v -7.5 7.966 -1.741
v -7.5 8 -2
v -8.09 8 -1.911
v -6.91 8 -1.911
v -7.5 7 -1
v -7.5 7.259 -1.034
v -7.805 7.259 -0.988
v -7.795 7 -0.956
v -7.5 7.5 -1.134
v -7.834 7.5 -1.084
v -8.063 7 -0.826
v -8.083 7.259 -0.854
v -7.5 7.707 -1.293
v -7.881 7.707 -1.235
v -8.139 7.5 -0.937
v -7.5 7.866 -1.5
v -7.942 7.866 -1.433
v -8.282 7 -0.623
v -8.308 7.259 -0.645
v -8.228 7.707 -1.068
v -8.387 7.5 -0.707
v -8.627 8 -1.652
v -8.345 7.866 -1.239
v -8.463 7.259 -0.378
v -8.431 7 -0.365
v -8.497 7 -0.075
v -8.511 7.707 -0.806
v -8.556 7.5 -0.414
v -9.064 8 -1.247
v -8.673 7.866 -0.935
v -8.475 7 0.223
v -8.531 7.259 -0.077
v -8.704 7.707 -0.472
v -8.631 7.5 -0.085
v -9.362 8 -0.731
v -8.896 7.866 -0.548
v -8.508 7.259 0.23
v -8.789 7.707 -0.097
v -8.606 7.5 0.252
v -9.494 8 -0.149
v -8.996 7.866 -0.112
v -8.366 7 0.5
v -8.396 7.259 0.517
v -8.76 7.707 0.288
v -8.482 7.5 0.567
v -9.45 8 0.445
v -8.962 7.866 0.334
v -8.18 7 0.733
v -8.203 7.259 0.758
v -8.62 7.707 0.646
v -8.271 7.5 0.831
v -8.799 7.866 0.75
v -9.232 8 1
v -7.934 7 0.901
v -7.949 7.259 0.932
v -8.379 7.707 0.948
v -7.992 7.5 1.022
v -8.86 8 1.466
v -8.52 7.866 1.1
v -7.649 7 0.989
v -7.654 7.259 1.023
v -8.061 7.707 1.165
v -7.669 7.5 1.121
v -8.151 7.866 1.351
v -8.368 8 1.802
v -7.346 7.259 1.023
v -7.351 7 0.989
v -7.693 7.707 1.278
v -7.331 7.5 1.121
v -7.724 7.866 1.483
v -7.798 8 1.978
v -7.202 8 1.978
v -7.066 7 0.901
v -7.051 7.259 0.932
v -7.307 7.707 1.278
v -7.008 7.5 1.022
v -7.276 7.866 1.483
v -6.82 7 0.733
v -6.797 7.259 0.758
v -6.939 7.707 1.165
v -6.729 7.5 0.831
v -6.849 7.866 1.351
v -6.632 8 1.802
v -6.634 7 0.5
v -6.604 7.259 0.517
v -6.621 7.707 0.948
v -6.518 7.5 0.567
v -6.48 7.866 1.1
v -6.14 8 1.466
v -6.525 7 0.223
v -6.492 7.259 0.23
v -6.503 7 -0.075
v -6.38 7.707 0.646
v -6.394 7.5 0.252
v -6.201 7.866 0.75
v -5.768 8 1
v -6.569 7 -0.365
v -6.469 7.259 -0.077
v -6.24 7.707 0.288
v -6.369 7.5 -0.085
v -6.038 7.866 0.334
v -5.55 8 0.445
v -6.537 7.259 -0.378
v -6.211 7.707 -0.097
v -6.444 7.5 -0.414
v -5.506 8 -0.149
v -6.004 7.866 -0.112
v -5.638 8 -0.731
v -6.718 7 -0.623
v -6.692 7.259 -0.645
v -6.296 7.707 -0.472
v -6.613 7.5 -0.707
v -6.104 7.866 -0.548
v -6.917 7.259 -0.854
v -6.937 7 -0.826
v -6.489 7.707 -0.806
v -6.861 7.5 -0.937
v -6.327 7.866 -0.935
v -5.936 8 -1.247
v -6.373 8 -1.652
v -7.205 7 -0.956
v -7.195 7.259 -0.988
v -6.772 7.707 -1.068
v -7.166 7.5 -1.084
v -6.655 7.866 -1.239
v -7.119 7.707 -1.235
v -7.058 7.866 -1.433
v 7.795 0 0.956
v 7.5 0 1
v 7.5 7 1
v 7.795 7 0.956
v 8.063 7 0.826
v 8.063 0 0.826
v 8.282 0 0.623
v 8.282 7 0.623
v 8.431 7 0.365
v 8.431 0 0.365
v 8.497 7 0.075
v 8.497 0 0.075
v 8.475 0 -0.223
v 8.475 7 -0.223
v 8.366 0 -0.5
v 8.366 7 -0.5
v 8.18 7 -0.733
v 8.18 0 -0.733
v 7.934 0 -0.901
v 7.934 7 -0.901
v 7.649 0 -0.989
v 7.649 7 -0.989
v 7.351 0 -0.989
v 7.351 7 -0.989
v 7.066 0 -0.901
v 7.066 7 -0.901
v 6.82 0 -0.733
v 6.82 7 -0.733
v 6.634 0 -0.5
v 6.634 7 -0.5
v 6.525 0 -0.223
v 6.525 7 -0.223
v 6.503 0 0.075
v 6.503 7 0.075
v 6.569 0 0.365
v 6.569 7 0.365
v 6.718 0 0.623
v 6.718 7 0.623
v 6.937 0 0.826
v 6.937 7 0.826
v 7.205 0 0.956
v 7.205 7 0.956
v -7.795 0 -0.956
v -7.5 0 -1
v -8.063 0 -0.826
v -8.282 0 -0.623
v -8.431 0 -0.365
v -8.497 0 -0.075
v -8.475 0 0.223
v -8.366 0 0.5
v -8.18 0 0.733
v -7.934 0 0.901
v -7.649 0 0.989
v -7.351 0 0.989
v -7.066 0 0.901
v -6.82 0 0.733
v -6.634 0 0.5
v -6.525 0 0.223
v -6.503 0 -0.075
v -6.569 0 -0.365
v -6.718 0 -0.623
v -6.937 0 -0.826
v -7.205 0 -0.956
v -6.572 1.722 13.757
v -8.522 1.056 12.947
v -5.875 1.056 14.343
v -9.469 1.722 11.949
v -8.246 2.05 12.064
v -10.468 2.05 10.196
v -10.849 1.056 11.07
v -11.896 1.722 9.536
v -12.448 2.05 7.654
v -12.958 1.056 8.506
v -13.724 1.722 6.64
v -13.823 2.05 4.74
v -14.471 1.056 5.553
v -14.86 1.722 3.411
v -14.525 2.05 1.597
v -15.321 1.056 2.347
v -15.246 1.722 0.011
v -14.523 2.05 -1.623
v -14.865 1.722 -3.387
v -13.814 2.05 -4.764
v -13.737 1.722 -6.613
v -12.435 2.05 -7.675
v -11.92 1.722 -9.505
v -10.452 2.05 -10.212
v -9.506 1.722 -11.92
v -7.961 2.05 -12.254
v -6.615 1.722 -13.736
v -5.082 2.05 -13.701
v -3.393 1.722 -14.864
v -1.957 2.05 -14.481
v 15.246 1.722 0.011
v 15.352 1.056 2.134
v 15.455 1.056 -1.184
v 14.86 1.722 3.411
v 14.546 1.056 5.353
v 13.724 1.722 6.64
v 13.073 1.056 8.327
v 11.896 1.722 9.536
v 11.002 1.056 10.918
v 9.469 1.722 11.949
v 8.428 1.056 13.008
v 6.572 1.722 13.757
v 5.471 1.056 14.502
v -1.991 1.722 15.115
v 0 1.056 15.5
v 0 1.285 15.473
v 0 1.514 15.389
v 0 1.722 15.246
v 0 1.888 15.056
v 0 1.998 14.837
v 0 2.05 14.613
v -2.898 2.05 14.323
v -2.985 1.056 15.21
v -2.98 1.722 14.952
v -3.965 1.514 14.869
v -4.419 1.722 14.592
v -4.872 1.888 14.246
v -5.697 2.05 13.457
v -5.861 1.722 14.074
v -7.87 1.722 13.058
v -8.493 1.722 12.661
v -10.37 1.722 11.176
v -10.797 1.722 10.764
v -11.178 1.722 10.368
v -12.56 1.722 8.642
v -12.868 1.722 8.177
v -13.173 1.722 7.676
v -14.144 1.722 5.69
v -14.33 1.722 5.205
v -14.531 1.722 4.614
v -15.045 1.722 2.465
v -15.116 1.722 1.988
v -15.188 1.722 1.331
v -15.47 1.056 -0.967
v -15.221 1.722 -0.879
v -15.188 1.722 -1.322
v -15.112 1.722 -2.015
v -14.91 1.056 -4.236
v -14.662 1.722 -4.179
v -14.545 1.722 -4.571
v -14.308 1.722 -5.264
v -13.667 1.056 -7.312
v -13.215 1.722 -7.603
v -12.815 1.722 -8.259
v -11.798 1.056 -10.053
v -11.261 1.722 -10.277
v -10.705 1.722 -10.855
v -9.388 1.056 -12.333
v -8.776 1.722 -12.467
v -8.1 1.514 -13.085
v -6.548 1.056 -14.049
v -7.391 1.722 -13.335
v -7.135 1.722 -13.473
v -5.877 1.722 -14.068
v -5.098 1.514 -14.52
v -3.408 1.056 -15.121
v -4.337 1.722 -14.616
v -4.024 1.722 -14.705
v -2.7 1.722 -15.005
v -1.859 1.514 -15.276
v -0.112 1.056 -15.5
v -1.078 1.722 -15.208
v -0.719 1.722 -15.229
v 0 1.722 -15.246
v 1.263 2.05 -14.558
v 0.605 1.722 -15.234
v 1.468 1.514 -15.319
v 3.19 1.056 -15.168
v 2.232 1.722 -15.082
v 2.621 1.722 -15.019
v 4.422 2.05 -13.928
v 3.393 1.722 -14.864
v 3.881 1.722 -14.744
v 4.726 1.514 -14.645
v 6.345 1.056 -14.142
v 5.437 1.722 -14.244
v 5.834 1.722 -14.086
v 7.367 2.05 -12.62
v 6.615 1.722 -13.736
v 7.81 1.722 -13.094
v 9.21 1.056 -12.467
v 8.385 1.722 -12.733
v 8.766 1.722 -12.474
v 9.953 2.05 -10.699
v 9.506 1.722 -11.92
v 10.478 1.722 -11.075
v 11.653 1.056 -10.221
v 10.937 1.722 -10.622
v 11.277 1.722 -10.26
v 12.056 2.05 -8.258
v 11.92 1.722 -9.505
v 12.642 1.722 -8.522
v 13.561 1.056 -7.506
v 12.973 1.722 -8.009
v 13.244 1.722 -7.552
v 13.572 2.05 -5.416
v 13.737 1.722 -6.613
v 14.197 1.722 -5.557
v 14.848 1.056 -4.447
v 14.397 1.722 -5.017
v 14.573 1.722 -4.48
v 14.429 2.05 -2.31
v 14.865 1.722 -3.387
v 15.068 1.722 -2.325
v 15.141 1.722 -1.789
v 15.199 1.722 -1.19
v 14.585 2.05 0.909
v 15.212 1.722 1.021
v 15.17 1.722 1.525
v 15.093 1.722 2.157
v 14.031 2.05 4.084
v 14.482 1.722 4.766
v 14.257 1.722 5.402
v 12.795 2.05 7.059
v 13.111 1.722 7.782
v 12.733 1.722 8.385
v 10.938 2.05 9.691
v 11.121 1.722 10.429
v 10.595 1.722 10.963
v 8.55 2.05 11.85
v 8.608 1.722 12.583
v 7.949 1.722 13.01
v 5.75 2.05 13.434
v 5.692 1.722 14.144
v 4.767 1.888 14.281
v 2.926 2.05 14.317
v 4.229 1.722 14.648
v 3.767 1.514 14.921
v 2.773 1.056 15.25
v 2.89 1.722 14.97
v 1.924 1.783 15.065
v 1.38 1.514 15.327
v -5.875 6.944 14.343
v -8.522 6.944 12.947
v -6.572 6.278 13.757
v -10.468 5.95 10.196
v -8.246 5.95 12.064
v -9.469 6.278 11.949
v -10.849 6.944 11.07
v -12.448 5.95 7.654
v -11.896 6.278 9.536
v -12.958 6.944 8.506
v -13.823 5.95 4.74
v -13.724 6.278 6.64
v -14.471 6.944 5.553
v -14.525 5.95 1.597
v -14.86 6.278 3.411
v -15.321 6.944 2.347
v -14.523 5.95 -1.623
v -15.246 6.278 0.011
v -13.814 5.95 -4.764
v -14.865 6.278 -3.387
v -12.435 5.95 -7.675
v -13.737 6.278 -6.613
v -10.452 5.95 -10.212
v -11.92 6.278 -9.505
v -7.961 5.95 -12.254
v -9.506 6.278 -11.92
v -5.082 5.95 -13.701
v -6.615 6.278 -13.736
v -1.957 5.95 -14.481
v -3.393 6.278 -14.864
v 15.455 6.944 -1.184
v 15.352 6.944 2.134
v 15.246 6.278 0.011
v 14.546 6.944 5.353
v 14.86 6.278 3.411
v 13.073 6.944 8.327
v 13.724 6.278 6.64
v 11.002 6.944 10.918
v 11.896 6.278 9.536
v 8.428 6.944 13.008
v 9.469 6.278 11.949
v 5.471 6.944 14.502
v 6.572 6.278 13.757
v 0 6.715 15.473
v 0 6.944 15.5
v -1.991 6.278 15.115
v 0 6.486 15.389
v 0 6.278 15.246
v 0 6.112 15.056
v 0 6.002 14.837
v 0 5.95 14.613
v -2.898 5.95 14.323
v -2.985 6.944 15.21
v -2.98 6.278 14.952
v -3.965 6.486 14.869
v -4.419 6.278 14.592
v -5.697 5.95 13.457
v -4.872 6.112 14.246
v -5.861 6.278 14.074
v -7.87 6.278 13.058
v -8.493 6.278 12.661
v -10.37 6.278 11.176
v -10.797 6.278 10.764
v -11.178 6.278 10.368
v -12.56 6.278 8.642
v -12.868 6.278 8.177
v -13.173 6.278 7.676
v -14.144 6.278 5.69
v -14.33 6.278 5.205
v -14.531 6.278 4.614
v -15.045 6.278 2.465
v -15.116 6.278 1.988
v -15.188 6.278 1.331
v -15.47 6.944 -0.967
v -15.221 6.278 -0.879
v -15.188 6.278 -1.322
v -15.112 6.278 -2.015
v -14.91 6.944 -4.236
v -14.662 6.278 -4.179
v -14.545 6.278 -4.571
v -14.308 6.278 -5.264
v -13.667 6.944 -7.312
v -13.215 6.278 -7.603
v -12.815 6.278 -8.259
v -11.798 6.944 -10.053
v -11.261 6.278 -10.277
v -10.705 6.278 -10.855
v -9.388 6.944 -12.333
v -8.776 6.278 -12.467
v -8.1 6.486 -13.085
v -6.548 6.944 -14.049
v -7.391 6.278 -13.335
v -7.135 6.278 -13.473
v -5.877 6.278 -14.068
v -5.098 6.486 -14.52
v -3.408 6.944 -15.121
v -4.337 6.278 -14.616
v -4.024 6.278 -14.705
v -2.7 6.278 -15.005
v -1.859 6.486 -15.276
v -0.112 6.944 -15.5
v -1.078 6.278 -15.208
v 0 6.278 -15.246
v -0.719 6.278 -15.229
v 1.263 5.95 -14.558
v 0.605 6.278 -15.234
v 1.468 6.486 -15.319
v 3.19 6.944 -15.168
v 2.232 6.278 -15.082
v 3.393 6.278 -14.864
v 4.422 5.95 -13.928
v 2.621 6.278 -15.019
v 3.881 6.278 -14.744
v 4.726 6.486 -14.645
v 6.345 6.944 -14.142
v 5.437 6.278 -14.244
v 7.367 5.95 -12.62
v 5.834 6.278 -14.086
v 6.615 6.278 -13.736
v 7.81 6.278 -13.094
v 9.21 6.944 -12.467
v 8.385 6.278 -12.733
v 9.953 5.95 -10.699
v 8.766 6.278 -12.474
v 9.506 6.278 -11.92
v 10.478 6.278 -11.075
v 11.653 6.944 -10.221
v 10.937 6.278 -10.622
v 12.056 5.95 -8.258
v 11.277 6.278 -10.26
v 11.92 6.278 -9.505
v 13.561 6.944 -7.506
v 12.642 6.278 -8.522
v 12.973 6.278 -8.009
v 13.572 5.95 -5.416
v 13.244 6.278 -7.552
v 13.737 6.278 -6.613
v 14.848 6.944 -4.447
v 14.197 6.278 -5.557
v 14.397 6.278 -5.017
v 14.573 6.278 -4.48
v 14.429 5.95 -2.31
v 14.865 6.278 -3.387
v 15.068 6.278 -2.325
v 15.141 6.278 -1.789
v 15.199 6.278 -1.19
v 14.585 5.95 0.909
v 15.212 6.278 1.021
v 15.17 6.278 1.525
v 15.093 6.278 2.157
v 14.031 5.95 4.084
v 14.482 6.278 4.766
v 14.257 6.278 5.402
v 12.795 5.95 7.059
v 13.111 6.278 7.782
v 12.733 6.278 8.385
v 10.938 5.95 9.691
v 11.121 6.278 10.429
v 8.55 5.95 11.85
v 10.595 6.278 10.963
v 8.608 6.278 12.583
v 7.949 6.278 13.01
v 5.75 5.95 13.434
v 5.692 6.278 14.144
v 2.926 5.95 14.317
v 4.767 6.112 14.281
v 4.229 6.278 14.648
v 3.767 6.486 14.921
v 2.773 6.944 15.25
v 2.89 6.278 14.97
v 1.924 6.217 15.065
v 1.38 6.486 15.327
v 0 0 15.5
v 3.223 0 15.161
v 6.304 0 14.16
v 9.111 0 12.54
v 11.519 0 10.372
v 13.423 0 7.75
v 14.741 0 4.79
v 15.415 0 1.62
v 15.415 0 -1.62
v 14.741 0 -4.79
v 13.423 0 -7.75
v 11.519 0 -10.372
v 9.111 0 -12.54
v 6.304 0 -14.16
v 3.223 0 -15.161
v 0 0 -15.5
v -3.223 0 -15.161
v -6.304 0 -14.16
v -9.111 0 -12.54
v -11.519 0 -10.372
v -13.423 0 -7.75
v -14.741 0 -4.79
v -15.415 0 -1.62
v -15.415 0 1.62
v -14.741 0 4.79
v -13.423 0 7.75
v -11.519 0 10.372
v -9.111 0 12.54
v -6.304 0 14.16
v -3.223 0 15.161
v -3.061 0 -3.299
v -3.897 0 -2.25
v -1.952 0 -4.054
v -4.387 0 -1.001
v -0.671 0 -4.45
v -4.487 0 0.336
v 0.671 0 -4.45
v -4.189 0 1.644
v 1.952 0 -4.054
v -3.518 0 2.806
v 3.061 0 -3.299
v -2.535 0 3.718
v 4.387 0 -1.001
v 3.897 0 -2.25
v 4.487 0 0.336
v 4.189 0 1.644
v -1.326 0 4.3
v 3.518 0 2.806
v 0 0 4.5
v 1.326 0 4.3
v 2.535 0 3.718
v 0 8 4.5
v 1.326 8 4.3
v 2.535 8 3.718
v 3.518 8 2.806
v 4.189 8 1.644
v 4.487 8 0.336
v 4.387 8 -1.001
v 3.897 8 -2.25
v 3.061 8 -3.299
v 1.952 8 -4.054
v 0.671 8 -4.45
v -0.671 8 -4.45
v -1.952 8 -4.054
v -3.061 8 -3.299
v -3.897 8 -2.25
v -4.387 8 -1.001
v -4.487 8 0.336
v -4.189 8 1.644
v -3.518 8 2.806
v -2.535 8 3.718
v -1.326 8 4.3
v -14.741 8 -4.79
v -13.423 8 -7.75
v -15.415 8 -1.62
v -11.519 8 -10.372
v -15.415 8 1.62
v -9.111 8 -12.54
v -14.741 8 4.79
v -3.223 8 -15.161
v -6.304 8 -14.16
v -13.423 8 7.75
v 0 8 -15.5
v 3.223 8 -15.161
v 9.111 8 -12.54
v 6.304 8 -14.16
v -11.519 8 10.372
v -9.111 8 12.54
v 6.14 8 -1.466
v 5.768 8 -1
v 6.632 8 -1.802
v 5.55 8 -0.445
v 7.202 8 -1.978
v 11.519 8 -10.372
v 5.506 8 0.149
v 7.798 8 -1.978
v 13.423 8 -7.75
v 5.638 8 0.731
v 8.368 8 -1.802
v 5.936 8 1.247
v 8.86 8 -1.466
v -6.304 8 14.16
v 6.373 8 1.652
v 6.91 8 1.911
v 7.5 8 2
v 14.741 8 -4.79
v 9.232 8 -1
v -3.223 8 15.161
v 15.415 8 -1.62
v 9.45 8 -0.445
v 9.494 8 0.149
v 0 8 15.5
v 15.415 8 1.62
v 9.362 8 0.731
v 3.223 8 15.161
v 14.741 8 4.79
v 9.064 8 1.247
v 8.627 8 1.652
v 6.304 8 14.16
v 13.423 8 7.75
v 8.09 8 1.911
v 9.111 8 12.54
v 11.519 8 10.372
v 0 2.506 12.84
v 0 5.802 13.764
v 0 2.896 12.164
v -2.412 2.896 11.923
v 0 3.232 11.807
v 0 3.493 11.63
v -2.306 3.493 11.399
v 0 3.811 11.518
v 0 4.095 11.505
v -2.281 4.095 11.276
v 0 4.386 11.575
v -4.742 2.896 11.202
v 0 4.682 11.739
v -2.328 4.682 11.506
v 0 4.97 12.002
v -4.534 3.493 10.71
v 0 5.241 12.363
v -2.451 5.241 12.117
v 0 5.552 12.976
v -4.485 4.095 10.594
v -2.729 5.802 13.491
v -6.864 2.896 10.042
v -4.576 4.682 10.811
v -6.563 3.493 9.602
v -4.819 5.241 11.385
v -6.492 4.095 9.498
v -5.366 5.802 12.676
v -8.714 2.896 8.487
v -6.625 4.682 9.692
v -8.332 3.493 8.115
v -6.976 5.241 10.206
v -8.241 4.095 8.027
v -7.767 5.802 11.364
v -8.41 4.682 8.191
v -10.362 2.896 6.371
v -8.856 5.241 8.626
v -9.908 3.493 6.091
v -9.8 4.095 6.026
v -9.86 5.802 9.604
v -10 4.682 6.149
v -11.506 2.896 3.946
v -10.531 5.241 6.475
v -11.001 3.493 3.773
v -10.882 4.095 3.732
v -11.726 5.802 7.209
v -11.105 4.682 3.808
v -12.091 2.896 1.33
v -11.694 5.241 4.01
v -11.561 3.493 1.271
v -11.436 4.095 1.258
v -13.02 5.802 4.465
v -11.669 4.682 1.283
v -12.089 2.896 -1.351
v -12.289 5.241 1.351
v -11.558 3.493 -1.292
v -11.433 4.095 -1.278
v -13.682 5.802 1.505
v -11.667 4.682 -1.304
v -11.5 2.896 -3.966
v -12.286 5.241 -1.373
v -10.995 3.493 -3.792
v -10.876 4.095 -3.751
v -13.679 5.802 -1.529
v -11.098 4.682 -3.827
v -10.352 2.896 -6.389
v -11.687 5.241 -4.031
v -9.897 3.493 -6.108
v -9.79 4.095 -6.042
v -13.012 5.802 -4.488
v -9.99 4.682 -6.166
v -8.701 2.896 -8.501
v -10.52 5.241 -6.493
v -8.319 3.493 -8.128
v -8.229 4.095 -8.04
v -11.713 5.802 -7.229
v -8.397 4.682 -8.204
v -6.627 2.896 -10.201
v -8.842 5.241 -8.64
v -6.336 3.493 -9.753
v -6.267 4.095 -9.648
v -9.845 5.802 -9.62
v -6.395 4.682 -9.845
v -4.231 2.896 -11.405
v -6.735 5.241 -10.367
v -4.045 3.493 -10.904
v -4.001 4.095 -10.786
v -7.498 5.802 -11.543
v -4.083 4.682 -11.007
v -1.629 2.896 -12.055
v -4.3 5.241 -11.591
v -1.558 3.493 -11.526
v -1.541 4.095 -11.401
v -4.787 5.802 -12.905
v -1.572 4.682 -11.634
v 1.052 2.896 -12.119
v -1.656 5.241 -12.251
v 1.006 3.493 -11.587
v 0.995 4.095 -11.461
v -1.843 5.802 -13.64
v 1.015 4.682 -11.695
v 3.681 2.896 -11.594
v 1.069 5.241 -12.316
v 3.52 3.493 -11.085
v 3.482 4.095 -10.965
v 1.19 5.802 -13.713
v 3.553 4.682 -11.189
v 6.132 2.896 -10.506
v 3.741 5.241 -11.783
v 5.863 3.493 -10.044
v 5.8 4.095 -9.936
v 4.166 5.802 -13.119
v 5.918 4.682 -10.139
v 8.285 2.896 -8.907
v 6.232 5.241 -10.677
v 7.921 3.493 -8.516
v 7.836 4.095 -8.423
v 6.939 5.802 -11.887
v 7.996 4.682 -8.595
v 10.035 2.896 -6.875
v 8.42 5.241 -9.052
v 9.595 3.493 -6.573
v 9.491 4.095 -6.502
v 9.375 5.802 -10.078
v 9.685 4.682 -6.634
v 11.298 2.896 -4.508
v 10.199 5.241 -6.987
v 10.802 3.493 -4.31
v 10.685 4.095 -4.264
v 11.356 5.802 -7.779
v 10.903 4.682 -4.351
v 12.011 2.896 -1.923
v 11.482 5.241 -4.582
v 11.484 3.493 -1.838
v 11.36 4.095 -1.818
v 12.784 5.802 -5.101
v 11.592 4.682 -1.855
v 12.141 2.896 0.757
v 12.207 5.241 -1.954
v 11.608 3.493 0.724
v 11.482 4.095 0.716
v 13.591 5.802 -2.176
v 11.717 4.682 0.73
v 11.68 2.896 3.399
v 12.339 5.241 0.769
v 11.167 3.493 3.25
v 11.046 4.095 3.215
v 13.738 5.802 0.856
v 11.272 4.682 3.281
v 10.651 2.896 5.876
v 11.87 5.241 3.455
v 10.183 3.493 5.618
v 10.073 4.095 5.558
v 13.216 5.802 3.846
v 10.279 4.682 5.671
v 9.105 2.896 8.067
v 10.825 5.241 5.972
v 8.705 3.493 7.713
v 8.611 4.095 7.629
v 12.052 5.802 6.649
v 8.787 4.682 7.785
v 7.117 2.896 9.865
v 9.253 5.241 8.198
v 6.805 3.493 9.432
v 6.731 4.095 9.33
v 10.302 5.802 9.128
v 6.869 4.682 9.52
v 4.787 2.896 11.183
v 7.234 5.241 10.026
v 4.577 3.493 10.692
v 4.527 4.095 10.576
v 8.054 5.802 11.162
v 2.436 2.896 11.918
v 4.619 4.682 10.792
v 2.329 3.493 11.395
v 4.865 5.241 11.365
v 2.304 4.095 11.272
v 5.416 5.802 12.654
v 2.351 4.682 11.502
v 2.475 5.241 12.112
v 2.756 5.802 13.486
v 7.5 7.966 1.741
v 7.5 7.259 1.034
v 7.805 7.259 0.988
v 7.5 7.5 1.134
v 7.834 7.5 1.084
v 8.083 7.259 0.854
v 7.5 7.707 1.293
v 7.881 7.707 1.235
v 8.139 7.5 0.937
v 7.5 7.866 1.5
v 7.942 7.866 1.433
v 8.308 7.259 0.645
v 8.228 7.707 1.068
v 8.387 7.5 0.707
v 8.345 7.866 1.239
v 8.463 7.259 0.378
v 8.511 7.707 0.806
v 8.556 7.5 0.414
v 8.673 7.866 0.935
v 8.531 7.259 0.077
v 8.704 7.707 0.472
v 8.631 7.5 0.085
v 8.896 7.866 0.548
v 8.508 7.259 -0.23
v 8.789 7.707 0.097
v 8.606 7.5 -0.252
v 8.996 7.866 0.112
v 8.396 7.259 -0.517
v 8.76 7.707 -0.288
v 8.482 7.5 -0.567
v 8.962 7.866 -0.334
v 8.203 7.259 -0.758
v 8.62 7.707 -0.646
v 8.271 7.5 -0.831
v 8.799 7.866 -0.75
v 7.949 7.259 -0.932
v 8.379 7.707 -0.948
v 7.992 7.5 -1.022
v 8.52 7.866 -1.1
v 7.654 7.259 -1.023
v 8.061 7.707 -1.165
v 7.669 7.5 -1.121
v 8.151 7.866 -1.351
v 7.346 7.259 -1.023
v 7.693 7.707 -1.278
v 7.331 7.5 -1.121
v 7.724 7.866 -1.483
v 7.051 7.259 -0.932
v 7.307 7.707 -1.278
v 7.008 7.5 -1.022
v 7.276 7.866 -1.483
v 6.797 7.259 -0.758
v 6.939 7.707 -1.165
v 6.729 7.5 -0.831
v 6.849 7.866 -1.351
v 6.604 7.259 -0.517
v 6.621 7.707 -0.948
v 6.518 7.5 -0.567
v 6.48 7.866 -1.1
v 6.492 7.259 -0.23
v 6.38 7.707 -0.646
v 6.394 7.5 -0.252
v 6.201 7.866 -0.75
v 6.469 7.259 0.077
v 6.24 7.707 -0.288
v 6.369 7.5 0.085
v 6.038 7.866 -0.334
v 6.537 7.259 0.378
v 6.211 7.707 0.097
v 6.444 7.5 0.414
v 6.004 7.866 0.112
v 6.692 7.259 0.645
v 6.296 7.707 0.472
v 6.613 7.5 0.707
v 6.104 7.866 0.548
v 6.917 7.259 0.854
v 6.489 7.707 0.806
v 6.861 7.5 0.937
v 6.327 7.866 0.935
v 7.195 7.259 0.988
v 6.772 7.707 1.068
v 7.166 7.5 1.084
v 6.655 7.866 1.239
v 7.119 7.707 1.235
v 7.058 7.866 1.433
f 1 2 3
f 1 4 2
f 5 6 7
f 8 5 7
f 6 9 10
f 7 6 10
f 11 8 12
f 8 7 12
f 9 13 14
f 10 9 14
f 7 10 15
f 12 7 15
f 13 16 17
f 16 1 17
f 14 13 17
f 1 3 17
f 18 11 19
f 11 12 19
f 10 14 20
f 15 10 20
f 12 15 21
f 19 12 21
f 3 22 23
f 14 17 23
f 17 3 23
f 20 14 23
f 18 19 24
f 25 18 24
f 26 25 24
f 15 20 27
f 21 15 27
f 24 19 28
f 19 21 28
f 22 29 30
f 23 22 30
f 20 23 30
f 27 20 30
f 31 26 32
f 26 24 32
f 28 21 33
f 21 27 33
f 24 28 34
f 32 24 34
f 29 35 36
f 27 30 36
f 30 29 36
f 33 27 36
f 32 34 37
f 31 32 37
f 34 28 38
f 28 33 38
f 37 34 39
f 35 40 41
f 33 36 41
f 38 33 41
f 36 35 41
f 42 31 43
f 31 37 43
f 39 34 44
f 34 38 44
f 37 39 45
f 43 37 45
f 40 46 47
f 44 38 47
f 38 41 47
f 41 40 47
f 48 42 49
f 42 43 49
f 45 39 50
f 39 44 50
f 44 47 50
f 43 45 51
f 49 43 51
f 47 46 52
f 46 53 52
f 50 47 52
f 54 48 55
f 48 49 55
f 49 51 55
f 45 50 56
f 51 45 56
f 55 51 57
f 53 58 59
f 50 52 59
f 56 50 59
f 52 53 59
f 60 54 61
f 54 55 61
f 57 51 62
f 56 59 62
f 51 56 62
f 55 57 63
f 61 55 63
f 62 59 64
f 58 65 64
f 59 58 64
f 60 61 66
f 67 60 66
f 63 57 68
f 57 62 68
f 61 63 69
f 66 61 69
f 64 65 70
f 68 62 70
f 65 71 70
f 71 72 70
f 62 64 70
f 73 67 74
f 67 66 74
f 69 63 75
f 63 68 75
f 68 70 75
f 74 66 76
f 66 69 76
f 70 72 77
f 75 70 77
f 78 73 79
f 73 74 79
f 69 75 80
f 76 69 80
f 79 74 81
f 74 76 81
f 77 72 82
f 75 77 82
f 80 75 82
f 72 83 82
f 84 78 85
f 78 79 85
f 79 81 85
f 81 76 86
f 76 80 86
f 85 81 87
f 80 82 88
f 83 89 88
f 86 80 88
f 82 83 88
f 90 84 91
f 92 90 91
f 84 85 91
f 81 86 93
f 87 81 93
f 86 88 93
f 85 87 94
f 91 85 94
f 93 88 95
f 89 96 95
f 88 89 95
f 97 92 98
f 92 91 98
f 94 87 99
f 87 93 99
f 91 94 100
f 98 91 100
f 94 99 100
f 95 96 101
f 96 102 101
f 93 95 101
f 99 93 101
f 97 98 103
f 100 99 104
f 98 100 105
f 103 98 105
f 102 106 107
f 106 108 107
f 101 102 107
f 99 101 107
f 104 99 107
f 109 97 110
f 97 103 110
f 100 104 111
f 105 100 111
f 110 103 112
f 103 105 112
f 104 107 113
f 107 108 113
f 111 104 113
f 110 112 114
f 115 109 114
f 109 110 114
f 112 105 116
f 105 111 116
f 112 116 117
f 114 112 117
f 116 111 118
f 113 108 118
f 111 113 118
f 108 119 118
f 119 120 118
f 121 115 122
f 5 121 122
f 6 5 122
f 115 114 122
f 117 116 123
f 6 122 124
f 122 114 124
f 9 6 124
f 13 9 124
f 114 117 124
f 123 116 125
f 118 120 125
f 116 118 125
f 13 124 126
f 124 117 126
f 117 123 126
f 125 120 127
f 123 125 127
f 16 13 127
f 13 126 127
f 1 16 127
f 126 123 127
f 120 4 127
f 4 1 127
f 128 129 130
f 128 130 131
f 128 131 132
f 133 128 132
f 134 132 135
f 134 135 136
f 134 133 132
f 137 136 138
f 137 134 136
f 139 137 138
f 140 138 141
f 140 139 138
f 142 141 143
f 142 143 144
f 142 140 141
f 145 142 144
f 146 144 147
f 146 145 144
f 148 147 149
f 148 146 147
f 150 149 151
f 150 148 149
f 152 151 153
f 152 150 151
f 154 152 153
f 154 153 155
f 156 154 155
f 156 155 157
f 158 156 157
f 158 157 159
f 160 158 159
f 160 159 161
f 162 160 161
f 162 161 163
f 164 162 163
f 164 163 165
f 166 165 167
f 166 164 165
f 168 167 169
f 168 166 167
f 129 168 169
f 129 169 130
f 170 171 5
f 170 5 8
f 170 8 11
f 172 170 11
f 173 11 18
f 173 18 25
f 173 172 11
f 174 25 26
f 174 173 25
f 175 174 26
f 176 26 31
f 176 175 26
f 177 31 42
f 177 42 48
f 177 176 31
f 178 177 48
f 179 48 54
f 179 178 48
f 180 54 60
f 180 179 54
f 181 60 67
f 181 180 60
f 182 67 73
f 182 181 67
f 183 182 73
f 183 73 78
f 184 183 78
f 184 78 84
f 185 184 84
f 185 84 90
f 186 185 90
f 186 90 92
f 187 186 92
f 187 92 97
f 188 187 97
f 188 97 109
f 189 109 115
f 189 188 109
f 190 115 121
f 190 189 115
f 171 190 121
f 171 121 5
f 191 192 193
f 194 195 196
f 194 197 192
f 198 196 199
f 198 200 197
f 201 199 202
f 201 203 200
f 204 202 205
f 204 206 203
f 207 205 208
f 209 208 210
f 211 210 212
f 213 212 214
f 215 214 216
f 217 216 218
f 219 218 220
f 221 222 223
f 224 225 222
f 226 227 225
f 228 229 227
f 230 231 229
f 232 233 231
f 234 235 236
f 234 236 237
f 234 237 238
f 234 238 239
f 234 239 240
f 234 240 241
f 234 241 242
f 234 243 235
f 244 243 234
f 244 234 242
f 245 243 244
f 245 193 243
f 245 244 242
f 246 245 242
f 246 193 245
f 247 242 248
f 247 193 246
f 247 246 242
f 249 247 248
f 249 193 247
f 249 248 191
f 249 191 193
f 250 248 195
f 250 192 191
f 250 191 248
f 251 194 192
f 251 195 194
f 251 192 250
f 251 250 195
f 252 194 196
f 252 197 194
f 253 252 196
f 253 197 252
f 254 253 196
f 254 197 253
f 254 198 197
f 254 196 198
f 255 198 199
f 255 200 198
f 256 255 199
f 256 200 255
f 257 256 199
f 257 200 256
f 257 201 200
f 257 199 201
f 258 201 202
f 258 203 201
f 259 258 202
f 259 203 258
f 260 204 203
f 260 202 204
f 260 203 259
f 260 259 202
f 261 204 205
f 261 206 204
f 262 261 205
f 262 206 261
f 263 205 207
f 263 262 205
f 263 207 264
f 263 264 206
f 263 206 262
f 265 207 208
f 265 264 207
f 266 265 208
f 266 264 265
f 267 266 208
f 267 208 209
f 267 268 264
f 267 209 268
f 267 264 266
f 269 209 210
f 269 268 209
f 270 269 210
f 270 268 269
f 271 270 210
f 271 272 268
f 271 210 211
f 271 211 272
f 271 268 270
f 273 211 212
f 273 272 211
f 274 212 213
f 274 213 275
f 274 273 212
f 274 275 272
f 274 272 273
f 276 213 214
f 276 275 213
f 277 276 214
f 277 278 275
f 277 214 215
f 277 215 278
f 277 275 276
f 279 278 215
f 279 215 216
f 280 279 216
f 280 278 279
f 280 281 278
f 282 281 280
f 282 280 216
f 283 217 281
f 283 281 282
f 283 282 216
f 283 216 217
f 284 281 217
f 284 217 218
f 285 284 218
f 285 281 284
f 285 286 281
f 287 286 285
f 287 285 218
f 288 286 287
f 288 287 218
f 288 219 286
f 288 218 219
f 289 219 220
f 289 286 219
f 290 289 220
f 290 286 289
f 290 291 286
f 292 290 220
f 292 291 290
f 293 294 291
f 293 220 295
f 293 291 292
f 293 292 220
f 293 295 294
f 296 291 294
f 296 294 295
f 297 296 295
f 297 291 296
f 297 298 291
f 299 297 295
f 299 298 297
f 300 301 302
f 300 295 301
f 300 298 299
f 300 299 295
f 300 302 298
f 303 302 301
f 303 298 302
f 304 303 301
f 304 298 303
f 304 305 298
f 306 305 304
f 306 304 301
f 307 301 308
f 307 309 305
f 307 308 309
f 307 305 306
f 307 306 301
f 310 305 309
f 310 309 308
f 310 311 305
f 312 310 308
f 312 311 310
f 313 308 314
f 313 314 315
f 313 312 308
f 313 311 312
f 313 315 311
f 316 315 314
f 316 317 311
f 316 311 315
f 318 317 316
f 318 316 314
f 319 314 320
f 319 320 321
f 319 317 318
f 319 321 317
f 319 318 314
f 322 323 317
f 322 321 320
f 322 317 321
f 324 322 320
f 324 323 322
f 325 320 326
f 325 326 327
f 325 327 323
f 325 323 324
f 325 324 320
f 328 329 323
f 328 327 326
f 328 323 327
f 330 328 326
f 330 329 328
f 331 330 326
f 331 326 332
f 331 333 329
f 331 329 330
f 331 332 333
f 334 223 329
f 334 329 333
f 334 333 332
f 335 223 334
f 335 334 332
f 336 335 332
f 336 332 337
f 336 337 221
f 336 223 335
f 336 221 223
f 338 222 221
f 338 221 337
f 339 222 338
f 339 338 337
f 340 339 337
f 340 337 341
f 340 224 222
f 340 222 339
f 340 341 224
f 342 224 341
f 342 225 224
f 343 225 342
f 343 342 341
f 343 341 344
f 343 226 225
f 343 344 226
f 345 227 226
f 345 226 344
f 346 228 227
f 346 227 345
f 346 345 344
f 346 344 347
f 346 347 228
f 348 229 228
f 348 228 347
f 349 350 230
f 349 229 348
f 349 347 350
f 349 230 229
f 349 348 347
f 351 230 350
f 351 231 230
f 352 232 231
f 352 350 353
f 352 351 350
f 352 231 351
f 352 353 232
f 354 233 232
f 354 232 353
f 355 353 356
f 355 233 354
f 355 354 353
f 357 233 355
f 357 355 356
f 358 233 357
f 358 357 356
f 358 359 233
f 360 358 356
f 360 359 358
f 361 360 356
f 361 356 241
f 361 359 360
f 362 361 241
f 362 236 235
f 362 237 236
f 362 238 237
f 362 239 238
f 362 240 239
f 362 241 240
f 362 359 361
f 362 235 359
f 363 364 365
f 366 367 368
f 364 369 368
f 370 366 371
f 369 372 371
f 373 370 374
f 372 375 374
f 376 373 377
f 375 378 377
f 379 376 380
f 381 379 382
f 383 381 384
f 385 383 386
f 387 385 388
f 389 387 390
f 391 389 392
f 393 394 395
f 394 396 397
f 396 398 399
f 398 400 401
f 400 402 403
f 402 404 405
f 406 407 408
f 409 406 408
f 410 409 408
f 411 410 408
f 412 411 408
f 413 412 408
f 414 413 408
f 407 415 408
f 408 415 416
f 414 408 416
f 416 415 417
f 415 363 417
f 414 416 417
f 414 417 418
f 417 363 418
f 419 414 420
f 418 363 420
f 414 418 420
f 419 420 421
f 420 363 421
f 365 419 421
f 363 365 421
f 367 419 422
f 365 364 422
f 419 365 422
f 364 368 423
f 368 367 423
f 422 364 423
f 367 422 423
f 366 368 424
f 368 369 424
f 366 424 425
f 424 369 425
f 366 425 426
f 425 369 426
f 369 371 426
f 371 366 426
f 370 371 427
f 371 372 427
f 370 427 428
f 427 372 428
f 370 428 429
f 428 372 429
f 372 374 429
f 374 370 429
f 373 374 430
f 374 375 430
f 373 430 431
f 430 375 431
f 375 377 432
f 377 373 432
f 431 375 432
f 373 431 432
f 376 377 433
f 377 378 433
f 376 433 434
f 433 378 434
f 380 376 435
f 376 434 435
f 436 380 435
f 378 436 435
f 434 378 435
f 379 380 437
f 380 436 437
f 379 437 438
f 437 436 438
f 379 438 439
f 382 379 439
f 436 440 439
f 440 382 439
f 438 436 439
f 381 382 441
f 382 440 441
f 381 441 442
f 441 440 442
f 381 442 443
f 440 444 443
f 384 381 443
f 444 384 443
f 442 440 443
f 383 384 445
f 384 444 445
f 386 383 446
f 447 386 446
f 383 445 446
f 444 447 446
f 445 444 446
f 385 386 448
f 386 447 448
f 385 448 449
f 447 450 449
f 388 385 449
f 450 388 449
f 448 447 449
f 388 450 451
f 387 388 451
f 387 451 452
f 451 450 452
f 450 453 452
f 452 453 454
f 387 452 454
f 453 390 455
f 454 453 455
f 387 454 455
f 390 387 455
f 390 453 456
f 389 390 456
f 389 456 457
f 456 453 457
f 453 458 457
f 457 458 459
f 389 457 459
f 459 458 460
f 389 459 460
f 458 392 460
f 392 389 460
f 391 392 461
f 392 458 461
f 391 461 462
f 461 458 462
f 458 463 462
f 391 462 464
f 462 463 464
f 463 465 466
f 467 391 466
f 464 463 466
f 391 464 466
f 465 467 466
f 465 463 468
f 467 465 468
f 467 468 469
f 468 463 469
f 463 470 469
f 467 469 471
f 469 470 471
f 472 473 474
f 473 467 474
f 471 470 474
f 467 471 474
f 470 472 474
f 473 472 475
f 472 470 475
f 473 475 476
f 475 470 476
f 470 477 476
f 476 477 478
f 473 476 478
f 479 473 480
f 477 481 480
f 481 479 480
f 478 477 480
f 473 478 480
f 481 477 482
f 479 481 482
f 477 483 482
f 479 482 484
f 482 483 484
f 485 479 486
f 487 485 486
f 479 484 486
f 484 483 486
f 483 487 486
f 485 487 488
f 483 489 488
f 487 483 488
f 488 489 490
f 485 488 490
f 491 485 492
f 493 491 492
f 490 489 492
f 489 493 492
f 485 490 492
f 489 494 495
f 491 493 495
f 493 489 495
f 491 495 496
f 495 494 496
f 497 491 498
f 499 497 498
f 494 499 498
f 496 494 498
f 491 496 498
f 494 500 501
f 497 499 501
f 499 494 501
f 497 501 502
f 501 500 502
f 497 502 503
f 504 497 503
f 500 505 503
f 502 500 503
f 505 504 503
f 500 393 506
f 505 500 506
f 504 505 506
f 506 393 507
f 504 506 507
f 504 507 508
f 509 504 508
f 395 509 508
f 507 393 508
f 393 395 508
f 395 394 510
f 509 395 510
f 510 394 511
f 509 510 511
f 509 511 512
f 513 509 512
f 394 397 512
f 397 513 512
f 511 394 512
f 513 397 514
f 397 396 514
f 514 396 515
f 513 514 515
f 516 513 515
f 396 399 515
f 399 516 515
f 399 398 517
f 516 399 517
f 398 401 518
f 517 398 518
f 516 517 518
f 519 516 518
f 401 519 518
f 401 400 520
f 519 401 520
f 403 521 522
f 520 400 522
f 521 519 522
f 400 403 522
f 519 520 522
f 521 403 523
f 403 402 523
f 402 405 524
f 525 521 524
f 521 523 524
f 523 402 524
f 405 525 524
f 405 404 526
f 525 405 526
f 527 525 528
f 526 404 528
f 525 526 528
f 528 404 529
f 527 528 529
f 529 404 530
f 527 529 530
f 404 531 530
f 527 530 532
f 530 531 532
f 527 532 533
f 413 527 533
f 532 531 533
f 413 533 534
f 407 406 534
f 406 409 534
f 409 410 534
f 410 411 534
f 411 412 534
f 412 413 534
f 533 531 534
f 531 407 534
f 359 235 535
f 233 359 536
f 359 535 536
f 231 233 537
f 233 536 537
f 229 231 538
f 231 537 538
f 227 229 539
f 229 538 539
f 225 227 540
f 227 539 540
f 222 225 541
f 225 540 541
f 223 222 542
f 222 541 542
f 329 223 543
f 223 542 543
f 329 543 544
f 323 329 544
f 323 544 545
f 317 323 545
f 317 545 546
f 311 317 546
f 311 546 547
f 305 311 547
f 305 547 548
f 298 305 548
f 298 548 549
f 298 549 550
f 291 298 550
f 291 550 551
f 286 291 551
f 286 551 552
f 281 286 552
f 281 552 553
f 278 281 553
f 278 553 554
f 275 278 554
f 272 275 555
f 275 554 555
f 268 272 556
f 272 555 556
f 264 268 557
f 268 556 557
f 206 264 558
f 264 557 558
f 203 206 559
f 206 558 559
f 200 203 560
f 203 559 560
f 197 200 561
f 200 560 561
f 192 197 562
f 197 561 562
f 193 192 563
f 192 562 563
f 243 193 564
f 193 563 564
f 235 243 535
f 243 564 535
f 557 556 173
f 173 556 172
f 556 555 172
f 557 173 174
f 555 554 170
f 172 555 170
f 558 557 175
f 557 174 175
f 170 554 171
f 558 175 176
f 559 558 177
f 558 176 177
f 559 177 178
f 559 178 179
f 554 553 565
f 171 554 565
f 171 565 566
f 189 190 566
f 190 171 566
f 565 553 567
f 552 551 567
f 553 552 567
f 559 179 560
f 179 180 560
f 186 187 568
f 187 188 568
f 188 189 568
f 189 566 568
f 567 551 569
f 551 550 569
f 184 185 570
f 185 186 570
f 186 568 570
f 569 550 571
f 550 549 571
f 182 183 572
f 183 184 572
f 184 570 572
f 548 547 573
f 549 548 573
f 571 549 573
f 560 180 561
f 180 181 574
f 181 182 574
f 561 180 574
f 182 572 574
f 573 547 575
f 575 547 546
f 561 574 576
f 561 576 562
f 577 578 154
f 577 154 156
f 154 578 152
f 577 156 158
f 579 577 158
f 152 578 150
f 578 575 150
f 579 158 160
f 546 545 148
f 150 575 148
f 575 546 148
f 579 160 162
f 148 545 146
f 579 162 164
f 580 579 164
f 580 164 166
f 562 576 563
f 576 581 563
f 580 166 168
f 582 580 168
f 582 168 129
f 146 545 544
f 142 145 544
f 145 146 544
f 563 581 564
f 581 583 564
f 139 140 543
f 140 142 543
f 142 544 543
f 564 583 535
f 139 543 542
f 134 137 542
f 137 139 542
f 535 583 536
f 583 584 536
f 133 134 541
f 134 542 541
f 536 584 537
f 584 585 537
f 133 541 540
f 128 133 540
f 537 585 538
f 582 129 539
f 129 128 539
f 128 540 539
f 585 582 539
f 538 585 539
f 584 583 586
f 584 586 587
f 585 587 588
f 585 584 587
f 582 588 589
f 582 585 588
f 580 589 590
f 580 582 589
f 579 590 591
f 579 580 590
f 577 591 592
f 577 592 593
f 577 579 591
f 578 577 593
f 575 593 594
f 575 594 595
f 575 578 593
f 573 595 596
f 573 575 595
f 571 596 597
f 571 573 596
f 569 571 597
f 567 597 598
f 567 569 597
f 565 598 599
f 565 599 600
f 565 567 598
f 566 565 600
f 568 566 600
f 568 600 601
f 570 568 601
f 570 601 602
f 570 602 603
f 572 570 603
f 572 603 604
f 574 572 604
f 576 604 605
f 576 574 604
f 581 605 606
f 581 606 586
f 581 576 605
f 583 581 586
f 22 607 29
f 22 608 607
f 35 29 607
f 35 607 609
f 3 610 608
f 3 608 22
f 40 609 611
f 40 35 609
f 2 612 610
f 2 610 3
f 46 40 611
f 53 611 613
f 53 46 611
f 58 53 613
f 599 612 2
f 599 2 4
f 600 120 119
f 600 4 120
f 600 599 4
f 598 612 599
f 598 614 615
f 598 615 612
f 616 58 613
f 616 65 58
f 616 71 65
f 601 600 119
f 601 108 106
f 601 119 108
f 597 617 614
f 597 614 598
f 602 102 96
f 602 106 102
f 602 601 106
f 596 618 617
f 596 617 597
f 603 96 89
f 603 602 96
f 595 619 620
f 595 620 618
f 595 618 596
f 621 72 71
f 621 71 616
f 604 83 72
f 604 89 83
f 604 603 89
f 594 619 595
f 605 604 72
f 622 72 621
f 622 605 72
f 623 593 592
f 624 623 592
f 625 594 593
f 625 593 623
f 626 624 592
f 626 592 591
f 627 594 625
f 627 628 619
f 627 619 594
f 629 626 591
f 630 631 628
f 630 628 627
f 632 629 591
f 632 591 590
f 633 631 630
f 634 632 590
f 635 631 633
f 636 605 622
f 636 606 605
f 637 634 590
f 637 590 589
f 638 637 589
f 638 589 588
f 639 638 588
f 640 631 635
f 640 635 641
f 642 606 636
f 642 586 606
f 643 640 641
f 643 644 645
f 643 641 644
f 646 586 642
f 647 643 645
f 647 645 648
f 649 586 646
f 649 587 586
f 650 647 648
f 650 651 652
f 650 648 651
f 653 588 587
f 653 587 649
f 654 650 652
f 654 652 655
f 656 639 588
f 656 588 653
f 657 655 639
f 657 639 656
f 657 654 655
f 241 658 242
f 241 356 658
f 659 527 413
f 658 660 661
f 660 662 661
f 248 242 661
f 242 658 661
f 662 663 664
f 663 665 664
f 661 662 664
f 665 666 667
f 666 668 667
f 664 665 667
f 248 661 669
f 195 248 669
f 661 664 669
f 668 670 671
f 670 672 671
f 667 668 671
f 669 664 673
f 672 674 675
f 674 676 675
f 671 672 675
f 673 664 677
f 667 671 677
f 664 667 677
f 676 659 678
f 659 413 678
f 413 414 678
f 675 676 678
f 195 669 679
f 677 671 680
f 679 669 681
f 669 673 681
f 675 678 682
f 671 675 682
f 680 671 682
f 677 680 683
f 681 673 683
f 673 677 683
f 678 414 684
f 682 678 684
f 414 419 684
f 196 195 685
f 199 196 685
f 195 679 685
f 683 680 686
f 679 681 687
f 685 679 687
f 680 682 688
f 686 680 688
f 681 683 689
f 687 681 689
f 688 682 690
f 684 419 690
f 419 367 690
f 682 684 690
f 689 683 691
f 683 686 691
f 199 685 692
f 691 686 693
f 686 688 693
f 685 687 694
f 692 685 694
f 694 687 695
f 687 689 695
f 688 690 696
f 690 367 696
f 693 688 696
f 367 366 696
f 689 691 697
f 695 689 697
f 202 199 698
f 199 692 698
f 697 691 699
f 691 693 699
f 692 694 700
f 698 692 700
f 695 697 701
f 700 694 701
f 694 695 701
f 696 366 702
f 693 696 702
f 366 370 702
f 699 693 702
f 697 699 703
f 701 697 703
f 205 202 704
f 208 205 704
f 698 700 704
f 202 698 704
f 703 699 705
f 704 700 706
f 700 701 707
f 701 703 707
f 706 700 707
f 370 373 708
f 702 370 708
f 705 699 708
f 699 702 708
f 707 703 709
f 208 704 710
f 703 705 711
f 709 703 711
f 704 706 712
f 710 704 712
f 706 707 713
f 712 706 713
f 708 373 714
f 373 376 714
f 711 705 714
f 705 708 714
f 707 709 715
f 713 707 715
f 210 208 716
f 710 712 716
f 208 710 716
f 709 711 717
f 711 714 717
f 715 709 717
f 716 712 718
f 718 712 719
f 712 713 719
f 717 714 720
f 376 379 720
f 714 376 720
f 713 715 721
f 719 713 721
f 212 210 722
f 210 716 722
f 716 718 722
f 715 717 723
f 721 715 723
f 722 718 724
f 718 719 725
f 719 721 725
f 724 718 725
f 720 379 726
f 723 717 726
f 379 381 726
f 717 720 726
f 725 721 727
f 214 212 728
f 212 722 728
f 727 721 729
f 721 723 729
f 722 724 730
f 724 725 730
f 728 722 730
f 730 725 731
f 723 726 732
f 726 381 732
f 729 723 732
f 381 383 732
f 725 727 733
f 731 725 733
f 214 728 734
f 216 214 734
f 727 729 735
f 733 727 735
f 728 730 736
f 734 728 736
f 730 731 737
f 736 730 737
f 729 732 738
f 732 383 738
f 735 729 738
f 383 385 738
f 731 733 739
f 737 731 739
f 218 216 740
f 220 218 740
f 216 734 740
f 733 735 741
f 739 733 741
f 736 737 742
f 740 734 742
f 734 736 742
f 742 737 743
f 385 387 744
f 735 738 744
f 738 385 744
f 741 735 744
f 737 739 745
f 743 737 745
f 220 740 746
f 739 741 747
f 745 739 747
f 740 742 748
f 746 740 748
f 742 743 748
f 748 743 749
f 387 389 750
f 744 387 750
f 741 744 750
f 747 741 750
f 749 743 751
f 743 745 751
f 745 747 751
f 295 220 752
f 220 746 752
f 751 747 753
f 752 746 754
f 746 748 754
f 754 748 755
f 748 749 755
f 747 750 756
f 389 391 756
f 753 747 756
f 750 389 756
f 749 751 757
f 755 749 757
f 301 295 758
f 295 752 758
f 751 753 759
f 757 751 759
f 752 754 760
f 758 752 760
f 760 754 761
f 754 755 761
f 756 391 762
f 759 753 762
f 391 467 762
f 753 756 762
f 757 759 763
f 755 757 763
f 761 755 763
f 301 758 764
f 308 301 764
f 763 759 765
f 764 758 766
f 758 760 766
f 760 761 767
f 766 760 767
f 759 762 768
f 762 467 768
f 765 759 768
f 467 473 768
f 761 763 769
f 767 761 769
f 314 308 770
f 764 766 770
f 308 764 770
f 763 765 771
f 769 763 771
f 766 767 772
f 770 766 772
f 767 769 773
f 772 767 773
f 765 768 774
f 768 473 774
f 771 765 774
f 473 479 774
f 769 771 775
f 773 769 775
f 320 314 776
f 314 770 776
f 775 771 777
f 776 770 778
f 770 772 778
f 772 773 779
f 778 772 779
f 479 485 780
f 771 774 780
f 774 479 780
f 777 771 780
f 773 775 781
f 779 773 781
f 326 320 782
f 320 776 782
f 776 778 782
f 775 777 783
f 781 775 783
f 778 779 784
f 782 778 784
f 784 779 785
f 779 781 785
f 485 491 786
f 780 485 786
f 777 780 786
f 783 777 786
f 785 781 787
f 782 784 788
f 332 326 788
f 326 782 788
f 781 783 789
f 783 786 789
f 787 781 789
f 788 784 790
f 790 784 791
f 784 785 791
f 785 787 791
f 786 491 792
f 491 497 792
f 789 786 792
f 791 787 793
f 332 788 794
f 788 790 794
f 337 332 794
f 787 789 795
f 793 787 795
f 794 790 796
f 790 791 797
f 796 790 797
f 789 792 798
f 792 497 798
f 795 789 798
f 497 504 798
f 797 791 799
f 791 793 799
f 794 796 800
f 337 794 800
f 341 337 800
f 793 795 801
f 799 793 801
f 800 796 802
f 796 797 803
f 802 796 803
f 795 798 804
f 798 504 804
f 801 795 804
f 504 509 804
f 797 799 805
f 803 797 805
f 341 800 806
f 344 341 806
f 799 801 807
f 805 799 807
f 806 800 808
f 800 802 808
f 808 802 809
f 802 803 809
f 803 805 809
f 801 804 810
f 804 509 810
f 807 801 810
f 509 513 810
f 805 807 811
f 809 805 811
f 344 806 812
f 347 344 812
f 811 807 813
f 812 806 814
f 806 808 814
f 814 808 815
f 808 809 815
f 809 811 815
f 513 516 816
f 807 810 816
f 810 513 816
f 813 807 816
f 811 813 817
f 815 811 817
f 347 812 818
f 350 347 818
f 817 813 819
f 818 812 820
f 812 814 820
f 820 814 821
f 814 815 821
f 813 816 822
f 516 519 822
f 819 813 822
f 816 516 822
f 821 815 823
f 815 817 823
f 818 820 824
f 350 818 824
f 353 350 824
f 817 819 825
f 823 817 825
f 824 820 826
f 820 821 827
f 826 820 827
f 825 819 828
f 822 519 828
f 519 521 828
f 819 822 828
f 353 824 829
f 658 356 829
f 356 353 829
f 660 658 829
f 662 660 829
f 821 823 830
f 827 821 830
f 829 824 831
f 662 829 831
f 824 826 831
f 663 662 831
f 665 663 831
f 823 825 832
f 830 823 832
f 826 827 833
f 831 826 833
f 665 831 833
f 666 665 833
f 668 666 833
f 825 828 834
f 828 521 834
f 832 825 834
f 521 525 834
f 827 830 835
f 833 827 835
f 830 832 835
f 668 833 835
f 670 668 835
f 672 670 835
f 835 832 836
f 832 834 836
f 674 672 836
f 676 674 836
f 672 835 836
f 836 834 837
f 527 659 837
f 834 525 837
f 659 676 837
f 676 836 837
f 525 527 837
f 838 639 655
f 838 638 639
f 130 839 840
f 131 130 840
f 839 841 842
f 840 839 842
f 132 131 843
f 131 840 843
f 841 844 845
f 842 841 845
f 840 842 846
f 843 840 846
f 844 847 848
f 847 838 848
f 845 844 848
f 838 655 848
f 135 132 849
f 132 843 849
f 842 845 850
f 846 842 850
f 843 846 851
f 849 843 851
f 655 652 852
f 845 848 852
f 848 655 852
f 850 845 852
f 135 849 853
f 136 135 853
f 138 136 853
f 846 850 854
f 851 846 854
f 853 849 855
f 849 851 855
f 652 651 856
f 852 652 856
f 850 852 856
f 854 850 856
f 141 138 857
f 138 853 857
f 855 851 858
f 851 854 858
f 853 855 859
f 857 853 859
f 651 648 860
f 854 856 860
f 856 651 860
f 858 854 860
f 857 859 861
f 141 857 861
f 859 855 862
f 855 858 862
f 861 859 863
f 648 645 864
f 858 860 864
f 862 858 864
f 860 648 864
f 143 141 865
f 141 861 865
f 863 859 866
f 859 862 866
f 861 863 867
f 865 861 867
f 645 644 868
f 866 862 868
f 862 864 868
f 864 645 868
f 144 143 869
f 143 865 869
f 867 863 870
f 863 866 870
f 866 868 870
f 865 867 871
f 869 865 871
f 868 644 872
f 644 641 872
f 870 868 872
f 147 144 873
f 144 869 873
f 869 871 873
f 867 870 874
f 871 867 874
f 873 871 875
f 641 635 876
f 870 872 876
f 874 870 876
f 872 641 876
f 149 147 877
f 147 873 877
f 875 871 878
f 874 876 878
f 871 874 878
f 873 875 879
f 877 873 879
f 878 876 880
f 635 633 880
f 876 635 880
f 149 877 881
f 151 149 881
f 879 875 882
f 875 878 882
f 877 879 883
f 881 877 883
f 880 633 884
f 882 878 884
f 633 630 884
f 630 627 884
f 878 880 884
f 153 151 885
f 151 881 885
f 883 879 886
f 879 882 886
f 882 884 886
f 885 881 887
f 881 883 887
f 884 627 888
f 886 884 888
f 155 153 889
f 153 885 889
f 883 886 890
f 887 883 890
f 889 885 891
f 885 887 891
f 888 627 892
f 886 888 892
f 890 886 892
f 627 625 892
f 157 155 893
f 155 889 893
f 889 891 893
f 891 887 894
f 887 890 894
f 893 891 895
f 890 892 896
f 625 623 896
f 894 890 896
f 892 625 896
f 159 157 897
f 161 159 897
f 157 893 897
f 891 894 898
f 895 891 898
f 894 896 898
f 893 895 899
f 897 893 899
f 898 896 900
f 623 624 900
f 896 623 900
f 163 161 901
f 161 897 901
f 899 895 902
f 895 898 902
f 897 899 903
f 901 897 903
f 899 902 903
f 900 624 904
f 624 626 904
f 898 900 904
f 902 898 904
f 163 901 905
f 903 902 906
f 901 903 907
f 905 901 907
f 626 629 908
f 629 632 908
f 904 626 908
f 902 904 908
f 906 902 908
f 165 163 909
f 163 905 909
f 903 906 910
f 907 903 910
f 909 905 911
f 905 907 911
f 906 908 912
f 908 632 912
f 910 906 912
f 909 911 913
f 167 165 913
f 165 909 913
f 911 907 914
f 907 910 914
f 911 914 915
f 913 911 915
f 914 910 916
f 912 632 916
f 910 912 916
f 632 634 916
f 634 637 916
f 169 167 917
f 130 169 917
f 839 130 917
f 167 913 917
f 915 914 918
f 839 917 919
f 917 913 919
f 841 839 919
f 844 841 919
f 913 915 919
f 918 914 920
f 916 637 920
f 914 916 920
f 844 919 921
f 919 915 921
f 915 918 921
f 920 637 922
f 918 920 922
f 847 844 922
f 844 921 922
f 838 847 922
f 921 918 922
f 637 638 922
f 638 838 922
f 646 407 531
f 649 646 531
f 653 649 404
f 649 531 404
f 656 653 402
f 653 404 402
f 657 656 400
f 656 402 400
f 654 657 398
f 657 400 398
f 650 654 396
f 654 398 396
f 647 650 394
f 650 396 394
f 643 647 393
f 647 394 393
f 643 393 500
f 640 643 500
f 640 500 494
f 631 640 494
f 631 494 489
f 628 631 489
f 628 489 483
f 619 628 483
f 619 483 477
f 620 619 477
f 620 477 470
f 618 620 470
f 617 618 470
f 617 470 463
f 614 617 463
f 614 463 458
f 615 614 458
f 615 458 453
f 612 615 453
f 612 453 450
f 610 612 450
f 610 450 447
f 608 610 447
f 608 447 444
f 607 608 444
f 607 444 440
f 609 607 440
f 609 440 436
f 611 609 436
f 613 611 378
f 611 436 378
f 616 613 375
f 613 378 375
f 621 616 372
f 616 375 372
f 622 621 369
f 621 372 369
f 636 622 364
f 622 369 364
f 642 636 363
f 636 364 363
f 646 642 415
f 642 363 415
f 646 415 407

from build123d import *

# Parameters (mm, degrees)
SKETCH2_R           = 15.5
SKETCH2_R_2         = 4.5
SKETCH2_R_3         = 1
BOSS_EXTRUDE1_DEPTH = 8
FILLET1_R           = 1
FILLET2_R           = 1


with BuildPart() as part:
    # Sketch2 → Boss-Extrude1 (new body)
    with BuildSketch(Plane(origin=(0, 0, 0), x_dir=(1, 0, 0), z_dir=(0, 1, 0))):
        with Locations(Location((0, 0, 0), (0, 0, 270))):
            Circle(SKETCH2_R)
        with Locations(Location((0, 0, 0), (0, 0, 270))):
            Circle(SKETCH2_R_2, mode=Mode.SUBTRACT)
        with Locations(Location((7.5, 0, 0), (0, 0, 270))):
            Circle(SKETCH2_R_3, mode=Mode.SUBTRACT)
        with Locations(Location((-7.5, 0, 0), (0, 0, 90))):
            Circle(SKETCH2_R_3, mode=Mode.SUBTRACT)
    extrude(amount=BOSS_EXTRUDE1_DEPTH)

    # Fillet1
    fillet1_edges = [part.edges().sort_by_distance(p)[0] for p in [
        (-7.5, 8, 1),
        (7.5, 8, -1),
    ]]
    fillet(fillet1_edges, radius=FILLET1_R)

    # Sketch4 → Cut-Revolve1 (revolve, cut)
    with BuildSketch(Plane.XY, mode=Mode.PRIVATE) as cut_revolve1_sk:
        with BuildLine():
            ThreePointArc((-15.5, 6), (-17.5, 4), (-15.5, 2))
            add(Edge.make_bspline(
                [(-15.5, 2), (-11.5, 2), (-11.5, 4), (-11.5, 6), (-15.5, 6)],
                knots=[4.71238898, 4.71238898, 4.71238898, 6.283185307, 6.283185307, 7.853981634, 7.853981634, 7.853981634], degree=2, weights=[1, 0.707106781, 1, 0.707106781, 1]))
        make_face()
    revolve(cut_revolve1_sk.sketch.rotate(Axis((0, 9.604734324, 0), (0, -1, 0)), 270), axis=Axis((0, 9.604734324, 0), (0, -1, 0)), mode=Mode.SUBTRACT)

    # Fillet2
    fillet2_edges = [part.edges().sort_by_distance(p)[0] for p in [
        (0, 6, -15.5),
        (0, 2, -15.5),
    ]]
    fillet(fillet2_edges, radius=FILLET2_R)


solid = part.part
